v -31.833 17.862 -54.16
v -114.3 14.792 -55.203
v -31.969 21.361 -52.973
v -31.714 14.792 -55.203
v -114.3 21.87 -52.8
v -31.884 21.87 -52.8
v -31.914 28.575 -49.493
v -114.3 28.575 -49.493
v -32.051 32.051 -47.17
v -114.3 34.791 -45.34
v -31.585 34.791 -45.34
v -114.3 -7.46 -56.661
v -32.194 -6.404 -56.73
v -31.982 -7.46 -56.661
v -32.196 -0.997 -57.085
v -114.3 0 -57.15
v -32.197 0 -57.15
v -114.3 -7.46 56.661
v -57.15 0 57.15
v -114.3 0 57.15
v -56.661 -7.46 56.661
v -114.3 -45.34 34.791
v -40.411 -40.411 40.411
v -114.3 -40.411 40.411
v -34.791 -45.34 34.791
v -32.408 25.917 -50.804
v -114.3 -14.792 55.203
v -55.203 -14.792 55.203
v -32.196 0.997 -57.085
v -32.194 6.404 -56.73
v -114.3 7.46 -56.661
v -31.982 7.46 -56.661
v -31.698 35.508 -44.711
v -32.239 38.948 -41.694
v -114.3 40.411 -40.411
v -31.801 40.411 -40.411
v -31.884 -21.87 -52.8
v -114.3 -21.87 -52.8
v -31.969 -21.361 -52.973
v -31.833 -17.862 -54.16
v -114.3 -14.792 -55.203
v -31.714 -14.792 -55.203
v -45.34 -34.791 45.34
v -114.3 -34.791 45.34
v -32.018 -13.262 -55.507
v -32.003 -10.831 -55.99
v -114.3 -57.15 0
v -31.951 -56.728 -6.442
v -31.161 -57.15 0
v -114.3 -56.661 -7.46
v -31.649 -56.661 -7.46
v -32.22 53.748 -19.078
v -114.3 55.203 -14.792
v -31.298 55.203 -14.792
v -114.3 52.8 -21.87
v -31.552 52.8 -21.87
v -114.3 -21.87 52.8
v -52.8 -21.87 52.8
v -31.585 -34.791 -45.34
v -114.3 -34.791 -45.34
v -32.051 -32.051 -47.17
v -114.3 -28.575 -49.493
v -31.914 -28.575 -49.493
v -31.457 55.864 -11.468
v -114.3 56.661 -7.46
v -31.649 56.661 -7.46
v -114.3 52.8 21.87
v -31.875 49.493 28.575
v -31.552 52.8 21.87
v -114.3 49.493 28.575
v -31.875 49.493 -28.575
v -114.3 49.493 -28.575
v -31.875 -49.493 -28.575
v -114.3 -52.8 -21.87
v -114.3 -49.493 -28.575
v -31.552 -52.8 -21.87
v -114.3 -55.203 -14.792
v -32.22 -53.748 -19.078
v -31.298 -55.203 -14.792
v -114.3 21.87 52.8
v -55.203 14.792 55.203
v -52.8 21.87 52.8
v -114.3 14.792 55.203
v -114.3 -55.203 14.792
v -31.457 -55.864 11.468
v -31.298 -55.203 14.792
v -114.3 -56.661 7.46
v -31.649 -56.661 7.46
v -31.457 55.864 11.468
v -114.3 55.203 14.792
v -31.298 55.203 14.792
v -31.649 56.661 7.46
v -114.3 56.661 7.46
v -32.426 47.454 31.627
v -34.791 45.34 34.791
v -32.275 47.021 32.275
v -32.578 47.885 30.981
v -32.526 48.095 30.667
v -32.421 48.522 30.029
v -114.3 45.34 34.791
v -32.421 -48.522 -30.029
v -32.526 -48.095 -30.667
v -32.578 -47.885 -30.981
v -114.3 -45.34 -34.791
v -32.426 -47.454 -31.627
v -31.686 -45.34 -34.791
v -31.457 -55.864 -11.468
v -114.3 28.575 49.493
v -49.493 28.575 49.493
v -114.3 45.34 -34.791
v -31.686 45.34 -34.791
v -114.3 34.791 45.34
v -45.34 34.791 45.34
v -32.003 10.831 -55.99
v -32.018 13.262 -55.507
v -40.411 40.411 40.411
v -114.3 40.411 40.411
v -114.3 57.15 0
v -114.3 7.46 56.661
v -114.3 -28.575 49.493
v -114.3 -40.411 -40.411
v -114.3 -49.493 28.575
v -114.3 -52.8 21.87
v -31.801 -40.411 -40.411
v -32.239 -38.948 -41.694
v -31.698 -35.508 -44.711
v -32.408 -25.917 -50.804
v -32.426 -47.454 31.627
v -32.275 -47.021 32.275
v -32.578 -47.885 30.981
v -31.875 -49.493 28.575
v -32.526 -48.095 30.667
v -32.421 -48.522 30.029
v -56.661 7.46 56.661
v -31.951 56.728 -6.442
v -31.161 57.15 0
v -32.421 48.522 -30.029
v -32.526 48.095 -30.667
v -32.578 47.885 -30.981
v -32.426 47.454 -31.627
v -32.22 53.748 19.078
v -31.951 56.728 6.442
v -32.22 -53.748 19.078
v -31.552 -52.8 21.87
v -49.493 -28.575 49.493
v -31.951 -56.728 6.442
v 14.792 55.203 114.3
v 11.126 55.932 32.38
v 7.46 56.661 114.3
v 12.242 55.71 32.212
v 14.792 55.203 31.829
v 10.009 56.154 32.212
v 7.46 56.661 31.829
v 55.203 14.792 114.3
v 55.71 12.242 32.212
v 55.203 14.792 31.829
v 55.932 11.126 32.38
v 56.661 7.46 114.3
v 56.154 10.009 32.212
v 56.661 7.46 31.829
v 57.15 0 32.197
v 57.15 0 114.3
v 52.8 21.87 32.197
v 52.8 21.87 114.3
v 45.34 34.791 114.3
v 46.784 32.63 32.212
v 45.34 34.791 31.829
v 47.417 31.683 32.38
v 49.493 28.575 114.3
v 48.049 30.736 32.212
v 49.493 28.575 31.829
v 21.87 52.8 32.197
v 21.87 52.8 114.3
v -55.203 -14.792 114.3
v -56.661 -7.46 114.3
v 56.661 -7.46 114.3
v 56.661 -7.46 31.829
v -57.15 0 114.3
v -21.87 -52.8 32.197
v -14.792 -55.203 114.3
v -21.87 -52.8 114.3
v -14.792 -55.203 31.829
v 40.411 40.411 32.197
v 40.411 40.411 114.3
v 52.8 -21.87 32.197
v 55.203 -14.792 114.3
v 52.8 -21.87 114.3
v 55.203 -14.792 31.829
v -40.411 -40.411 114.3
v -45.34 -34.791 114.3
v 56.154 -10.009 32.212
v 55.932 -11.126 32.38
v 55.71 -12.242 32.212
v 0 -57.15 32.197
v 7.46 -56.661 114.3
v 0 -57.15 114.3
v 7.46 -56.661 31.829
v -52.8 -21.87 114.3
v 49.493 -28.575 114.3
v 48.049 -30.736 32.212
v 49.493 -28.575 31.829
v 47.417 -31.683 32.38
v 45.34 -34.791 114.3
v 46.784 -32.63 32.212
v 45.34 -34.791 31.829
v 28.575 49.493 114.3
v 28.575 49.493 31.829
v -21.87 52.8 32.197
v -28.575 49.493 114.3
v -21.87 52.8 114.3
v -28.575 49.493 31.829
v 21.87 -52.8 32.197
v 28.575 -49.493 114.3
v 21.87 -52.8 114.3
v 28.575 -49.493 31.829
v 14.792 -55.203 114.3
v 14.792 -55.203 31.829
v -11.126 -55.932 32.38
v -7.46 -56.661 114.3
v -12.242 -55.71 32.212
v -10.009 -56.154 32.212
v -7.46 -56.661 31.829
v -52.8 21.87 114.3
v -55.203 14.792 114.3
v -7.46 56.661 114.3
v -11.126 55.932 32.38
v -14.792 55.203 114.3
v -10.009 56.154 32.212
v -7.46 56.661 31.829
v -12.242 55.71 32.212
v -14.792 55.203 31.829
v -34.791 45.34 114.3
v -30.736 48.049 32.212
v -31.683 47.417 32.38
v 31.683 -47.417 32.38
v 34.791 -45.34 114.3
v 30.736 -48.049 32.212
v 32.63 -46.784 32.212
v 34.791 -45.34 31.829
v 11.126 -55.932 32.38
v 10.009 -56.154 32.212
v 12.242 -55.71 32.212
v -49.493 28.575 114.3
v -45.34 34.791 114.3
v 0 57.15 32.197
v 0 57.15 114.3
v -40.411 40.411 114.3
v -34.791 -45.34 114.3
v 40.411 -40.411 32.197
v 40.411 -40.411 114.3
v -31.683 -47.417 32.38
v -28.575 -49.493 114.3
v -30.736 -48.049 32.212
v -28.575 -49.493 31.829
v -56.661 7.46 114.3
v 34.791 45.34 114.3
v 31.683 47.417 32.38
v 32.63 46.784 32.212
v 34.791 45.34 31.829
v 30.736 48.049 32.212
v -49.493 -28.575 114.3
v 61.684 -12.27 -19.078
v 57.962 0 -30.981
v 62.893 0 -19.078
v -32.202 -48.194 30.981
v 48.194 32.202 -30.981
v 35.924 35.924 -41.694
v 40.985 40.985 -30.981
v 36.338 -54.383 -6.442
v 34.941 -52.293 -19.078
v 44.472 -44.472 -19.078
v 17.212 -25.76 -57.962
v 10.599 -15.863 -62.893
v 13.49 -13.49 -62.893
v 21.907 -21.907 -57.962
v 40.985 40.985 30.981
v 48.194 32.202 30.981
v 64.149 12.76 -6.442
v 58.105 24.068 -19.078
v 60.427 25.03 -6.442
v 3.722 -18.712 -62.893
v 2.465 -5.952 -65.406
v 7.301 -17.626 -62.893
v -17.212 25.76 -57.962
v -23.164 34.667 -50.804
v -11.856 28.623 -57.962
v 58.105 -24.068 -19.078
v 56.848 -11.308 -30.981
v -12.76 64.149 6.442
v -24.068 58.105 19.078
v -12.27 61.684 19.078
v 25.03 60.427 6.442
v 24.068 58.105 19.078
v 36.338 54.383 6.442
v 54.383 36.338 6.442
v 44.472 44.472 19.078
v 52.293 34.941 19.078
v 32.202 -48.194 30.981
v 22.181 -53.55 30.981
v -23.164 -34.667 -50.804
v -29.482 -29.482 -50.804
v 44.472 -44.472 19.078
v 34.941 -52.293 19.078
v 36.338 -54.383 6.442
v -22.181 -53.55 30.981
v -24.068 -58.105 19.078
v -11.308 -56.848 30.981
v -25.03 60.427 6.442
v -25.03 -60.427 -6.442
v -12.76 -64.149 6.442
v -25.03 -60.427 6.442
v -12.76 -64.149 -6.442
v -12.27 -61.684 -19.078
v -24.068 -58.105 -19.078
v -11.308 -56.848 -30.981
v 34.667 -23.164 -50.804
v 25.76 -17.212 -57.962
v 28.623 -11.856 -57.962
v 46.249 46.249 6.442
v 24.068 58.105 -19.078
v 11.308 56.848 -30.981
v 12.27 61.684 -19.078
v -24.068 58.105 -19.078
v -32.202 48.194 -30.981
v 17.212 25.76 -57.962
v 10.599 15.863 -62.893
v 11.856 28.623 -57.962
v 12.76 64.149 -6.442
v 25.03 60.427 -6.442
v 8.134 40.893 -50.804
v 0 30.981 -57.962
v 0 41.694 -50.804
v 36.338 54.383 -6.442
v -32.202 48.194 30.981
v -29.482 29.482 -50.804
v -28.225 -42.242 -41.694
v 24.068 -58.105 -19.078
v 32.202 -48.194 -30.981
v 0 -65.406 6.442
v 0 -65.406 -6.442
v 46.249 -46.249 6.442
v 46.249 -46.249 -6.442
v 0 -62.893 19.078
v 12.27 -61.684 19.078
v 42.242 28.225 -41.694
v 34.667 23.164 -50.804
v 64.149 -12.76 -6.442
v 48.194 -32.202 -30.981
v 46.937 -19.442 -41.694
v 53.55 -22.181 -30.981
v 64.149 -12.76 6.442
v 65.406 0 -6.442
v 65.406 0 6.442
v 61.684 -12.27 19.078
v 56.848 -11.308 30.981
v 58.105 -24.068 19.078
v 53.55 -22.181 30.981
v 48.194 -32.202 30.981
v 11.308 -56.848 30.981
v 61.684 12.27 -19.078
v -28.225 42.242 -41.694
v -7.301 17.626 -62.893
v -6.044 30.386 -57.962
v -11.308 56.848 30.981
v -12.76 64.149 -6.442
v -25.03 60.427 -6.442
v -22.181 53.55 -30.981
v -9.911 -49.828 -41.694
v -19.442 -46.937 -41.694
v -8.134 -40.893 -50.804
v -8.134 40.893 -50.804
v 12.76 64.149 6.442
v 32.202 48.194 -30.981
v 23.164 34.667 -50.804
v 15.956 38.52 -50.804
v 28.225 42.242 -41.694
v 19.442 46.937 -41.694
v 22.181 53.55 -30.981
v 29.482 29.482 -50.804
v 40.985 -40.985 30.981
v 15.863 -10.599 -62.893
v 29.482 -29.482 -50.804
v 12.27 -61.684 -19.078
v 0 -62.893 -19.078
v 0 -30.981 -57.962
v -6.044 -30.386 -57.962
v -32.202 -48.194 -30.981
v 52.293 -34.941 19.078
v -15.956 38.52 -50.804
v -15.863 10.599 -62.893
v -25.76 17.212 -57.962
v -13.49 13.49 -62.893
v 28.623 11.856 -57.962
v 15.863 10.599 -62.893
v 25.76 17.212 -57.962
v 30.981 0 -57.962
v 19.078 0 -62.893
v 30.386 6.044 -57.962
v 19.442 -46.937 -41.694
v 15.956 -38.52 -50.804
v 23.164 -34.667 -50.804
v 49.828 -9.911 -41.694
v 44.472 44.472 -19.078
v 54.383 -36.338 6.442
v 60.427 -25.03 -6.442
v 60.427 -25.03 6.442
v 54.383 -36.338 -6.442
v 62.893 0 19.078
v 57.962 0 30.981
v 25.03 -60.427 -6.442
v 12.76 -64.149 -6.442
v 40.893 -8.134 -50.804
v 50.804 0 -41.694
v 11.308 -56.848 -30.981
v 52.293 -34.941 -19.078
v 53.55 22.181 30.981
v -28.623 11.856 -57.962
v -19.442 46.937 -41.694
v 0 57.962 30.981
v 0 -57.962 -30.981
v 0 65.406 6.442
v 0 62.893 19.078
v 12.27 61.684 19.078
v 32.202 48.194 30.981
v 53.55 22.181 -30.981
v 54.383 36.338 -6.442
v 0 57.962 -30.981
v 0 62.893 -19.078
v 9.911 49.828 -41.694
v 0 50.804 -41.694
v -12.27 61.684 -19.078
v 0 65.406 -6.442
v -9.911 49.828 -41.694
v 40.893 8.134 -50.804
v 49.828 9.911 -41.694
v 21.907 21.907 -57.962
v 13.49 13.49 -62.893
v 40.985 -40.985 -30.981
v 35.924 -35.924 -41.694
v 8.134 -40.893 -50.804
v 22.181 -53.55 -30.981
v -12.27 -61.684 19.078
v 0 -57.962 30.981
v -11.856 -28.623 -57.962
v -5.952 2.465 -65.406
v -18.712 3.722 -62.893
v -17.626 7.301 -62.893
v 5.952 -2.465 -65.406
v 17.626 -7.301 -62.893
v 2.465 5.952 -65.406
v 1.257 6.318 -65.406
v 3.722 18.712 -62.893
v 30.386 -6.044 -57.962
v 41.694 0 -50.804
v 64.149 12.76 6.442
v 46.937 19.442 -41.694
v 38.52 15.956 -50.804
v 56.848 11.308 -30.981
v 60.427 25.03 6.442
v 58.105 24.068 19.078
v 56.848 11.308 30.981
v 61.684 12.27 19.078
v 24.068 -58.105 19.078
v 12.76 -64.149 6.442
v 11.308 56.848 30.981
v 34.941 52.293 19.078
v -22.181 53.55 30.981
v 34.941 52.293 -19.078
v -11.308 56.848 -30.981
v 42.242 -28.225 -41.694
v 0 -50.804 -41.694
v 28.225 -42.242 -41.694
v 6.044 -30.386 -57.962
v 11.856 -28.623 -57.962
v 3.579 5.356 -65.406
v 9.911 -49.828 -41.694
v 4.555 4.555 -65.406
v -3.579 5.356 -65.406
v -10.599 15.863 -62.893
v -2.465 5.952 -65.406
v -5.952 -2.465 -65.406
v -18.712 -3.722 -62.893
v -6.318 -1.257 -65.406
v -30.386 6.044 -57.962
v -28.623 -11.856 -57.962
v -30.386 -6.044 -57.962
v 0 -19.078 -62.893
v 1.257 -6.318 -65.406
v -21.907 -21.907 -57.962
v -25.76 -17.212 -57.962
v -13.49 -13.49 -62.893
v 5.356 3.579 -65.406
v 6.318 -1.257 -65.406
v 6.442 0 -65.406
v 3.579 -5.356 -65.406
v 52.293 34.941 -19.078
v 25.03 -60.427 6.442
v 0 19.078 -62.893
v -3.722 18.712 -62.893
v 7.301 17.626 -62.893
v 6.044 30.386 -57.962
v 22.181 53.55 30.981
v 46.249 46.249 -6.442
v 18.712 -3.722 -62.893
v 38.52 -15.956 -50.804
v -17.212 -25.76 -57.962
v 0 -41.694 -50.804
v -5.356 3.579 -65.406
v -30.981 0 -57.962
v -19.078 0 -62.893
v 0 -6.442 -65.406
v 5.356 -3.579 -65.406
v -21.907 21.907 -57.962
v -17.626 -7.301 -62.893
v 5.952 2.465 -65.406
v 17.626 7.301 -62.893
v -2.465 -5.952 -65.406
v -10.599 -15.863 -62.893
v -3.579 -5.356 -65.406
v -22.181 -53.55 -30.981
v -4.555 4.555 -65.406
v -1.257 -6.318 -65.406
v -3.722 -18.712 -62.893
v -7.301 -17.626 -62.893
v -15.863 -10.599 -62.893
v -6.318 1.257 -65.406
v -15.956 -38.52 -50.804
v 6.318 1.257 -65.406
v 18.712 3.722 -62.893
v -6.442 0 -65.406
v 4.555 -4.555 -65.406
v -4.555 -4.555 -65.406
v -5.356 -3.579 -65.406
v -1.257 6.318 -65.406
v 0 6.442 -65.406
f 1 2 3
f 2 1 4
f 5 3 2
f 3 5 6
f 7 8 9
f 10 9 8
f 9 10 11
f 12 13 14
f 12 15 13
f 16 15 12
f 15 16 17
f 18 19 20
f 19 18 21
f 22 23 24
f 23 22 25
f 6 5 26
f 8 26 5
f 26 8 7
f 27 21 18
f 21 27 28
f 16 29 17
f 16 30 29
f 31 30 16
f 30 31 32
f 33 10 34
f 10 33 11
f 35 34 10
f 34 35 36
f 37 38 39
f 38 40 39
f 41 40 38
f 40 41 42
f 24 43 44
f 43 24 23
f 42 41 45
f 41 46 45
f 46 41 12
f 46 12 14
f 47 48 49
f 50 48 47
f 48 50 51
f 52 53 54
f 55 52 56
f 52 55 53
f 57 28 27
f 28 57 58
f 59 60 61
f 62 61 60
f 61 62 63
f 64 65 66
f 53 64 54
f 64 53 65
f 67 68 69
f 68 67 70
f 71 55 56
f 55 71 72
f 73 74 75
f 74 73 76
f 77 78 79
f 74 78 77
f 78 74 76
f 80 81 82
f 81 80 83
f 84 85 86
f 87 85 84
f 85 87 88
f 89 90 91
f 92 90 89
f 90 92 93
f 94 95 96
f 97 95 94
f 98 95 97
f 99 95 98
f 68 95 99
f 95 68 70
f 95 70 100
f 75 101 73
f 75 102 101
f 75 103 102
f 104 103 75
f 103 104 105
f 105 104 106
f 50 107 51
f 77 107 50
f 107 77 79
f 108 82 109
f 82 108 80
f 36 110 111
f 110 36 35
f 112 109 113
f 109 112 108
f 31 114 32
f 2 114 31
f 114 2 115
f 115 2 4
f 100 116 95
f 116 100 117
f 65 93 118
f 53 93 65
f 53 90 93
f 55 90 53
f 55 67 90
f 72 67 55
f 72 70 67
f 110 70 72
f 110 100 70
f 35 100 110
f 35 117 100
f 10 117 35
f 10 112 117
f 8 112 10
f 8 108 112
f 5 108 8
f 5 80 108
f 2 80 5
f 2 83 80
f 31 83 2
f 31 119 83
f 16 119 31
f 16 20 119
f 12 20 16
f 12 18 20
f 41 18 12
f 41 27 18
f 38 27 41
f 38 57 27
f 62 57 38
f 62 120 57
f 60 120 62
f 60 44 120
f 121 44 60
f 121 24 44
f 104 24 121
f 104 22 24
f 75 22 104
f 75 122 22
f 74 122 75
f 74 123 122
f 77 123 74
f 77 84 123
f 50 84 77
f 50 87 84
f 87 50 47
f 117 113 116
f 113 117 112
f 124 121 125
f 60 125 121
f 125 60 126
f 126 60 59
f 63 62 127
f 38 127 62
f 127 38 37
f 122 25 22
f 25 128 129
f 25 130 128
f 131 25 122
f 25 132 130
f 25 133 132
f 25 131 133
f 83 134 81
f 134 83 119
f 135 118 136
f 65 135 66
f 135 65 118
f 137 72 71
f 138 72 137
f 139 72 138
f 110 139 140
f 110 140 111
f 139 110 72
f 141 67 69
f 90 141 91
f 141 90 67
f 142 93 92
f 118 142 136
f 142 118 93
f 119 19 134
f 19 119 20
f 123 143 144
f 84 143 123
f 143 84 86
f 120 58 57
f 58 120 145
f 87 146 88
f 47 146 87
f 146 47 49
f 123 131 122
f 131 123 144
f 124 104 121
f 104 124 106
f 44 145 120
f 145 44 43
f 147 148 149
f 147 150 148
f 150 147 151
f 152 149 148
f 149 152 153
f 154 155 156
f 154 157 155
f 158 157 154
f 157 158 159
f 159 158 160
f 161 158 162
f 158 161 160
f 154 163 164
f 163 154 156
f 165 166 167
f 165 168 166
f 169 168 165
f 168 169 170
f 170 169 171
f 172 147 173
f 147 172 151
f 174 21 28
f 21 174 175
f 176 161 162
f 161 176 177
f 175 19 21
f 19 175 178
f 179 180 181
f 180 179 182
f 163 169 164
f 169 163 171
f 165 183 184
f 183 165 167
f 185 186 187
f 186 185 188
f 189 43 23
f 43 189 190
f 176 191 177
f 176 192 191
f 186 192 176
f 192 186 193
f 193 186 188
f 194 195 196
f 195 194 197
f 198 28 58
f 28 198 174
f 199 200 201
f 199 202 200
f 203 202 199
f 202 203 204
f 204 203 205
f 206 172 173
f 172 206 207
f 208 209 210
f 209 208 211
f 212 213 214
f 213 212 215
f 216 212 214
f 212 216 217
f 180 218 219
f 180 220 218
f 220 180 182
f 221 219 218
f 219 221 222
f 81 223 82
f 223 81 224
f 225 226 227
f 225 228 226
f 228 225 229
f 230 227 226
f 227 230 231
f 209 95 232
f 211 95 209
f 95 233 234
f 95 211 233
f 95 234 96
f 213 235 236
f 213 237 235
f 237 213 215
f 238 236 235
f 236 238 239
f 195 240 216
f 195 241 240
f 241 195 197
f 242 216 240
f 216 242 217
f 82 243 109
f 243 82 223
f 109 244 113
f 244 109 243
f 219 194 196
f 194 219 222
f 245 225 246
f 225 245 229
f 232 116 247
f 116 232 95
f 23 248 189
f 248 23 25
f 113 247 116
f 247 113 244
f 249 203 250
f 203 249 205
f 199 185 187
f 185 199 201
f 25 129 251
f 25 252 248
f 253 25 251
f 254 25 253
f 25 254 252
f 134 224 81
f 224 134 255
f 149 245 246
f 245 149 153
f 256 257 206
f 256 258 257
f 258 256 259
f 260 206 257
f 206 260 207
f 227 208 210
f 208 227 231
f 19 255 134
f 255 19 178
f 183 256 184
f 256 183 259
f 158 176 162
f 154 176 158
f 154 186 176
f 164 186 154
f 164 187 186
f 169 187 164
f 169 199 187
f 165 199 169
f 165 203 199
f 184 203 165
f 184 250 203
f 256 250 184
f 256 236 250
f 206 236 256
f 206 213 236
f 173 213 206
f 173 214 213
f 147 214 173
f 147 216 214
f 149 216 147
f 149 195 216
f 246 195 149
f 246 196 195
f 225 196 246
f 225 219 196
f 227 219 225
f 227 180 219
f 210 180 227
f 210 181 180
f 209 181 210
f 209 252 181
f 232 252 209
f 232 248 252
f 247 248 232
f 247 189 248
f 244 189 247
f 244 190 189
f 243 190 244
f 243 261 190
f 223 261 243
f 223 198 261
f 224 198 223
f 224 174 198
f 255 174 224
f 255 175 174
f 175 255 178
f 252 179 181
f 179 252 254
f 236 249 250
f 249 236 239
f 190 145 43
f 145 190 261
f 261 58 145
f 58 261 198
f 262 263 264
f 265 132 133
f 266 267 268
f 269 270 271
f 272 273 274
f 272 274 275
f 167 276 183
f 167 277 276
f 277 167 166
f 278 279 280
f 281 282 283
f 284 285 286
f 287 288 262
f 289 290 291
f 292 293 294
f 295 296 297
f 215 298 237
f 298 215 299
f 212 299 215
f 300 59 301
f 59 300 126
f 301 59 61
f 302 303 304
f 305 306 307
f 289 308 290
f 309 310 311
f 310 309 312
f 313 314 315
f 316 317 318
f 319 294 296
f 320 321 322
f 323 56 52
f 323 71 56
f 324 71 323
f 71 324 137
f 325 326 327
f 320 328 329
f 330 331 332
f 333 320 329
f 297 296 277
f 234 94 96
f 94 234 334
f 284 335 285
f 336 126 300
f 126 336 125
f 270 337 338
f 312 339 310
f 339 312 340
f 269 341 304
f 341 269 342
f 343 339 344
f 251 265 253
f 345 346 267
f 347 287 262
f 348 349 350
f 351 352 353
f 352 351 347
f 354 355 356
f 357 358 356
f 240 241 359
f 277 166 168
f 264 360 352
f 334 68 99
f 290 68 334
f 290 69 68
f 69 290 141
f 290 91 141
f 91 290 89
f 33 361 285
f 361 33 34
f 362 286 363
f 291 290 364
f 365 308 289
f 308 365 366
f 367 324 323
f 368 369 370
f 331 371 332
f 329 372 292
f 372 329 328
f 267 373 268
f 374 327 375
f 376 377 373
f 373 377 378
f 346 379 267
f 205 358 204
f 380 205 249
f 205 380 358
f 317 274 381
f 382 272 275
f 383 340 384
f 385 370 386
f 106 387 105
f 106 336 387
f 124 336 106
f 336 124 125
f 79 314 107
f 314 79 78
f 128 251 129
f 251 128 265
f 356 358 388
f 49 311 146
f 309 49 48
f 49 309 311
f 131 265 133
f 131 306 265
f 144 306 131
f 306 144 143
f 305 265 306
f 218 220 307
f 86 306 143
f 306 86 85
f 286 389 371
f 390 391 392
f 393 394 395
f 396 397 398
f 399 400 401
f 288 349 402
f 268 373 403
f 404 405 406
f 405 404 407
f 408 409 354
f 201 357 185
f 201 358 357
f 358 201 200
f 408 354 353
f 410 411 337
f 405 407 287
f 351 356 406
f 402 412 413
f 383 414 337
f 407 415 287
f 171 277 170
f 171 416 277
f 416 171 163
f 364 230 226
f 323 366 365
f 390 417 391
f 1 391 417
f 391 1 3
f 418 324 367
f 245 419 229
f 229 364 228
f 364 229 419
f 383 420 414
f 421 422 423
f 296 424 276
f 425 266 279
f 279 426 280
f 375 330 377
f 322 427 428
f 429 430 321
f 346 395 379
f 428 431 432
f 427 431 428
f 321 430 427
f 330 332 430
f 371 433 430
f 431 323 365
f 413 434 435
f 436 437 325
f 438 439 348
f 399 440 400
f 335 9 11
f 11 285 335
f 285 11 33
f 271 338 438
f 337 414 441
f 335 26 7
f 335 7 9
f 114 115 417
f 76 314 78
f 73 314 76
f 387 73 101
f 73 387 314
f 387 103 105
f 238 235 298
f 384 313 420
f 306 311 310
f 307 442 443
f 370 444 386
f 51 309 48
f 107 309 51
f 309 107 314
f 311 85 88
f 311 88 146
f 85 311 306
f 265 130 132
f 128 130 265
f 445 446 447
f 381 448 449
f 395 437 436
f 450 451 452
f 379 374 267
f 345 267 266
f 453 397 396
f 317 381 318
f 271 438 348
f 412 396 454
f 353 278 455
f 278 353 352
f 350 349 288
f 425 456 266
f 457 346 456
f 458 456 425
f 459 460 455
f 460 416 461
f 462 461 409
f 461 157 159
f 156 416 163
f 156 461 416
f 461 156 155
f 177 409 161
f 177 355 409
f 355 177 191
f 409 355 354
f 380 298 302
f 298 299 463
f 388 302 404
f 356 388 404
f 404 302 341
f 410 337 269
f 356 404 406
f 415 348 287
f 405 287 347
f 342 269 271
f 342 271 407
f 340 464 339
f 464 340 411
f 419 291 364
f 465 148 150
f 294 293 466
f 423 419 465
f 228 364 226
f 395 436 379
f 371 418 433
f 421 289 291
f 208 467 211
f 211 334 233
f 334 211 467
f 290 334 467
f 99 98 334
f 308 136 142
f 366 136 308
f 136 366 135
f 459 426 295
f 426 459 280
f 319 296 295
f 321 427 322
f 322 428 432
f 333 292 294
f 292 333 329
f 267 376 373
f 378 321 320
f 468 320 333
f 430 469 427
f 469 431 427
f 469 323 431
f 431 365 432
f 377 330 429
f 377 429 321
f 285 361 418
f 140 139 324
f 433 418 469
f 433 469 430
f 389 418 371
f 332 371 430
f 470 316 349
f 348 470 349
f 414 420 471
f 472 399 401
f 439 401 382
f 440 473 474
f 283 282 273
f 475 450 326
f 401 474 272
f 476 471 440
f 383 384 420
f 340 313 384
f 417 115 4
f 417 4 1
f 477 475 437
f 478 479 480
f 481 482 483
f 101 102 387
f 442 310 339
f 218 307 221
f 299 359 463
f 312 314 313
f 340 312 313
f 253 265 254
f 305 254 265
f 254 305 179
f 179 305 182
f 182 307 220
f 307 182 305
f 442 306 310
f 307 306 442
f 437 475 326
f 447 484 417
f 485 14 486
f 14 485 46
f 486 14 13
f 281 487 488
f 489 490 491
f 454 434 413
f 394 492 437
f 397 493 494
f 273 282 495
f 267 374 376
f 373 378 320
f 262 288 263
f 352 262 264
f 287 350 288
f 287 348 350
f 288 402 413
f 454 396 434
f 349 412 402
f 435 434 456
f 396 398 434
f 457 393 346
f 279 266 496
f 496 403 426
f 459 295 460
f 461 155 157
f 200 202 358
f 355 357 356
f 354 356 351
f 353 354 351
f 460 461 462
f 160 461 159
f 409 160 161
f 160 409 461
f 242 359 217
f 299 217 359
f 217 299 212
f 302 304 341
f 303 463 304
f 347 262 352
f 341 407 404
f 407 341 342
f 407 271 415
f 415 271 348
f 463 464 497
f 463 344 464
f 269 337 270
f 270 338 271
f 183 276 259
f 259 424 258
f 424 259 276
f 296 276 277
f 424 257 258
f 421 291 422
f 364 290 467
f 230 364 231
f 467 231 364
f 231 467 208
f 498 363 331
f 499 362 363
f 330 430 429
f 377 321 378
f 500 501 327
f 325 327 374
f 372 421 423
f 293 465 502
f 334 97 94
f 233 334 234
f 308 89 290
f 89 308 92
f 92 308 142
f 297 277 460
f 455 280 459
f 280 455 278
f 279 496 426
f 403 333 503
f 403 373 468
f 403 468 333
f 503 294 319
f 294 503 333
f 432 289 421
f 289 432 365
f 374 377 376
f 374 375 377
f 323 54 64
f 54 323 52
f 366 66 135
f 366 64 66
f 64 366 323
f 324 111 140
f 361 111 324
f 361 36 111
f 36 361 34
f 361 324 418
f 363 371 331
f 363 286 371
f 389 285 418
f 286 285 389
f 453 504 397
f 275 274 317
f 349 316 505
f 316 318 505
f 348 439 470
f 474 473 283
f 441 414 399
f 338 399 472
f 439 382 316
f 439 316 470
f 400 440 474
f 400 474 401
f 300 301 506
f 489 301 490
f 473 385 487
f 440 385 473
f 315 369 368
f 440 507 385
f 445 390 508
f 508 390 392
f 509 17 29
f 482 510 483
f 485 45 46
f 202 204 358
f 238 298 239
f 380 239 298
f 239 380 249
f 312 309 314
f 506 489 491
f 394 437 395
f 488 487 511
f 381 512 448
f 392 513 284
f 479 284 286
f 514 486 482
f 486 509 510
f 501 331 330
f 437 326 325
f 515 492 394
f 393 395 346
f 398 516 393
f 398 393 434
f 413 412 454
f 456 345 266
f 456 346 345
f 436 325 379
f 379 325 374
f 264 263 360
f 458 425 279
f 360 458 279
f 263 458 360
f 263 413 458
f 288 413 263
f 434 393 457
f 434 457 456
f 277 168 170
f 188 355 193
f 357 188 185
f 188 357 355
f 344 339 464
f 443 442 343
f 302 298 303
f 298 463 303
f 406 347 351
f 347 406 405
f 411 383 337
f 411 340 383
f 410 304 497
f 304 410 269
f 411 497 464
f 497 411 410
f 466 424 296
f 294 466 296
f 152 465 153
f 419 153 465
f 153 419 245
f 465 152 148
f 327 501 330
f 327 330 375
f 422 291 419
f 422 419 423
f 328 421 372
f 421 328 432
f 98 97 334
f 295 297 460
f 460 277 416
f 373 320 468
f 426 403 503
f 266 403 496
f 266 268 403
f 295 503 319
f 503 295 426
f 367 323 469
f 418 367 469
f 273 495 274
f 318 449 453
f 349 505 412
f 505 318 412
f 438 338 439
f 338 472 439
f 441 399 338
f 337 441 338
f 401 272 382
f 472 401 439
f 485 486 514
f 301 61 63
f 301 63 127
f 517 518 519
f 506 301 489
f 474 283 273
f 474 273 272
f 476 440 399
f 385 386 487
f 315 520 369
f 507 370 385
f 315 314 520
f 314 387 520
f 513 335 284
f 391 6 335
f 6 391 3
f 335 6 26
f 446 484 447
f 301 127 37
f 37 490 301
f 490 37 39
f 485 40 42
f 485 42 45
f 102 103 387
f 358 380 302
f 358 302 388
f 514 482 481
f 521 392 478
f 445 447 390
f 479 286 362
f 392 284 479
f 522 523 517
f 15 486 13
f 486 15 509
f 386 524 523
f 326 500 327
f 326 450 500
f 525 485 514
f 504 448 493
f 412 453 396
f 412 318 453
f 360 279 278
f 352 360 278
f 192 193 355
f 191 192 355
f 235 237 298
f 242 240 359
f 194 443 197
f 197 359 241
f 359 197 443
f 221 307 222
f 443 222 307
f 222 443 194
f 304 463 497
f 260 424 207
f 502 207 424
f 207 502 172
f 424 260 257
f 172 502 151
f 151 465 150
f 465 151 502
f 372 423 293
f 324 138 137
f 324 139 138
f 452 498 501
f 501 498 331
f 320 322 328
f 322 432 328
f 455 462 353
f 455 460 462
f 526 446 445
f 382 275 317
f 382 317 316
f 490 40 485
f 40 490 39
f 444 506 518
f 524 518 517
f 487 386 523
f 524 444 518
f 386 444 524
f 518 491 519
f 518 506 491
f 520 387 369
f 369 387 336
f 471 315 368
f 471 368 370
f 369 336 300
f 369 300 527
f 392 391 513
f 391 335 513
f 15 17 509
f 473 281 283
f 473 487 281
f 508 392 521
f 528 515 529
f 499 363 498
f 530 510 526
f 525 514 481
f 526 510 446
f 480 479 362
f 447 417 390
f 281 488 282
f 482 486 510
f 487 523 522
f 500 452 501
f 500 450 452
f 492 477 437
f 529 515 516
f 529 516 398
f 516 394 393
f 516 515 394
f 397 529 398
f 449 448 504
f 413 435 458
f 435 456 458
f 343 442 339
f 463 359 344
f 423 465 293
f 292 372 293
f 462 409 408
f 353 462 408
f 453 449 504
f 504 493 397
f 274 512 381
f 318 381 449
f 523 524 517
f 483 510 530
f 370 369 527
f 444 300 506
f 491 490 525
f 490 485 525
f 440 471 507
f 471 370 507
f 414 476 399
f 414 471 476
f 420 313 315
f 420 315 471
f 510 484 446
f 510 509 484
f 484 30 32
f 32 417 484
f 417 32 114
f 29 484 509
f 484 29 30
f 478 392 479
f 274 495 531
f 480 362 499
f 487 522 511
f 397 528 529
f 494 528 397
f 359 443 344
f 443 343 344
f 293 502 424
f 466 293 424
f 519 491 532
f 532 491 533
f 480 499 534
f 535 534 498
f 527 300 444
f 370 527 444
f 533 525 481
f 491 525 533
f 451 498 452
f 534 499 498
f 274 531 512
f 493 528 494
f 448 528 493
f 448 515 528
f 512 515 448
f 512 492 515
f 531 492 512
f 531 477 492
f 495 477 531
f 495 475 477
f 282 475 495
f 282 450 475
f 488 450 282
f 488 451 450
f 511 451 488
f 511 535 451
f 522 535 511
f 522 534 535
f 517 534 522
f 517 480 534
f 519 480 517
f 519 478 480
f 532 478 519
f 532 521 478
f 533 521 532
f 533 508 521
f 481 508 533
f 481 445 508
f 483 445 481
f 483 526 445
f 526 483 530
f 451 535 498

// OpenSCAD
// Auto-generated by scripts/author_from_manifest.py (Phase D.3).
// Source: data/phase_d_manifest.json (sku_intent='victaulic-no10-elbow-90-grooved-4in').
// Do not hand-edit — regenerate from the manifest.
//
// @part victaulic_no10_elbow_90_grooved_4in
// @kind fitting
// @category fitting.elbow
// @display-name "Victaulic No. 10 90° Grooved Elbow 4\""
// @mfg victaulic
// @mfg-pn No._10_4in
// @listing UL FM
// @price-usd 52.00
// @install-minutes 6
// @crew journeyman
// @param size_in number default=4 label="Size" unit="in"
// @port in position=[-0.05,0,0] direction=[-1,0,0] style=grooved size_in=4 role=run_a
// @port out position=[0,0,0.05] direction=[0,0,1] style=grooved size_in=4 role=run_b

size_in = 4.0;

function od_mm(nps) =
    nps ==   1  ? 33.4 :
    nps == 1.25 ? 42.2 :
    nps == 1.5  ? 48.3 :
    nps ==   2  ? 60.3 :
    nps == 2.5  ? 73.0 :
    nps ==   3  ? 88.9 :
    nps ==   4  ? 114.3 :
    nps ==   5  ? 141.3 :
    nps ==   6  ? 168.3 :
    nps ==   8  ? 219.1 :
    nps ==  10  ? 273.0 : 60.3;

od = od_mm(size_in);
leg = od * 1.0;

union() {
    // Inlet leg along -X
    translate([-leg/2, 0, 0])
        rotate([0, 90, 0])
        cylinder(h = leg, d = od, center = true, $fn = 48);
    // Outlet leg along +Z
    translate([0, 0, leg/2])
        cylinder(h = leg, d = od, center = true, $fn = 48);
    // Knuckle
    sphere(d = od * 1.15, $fn = 32);
}
